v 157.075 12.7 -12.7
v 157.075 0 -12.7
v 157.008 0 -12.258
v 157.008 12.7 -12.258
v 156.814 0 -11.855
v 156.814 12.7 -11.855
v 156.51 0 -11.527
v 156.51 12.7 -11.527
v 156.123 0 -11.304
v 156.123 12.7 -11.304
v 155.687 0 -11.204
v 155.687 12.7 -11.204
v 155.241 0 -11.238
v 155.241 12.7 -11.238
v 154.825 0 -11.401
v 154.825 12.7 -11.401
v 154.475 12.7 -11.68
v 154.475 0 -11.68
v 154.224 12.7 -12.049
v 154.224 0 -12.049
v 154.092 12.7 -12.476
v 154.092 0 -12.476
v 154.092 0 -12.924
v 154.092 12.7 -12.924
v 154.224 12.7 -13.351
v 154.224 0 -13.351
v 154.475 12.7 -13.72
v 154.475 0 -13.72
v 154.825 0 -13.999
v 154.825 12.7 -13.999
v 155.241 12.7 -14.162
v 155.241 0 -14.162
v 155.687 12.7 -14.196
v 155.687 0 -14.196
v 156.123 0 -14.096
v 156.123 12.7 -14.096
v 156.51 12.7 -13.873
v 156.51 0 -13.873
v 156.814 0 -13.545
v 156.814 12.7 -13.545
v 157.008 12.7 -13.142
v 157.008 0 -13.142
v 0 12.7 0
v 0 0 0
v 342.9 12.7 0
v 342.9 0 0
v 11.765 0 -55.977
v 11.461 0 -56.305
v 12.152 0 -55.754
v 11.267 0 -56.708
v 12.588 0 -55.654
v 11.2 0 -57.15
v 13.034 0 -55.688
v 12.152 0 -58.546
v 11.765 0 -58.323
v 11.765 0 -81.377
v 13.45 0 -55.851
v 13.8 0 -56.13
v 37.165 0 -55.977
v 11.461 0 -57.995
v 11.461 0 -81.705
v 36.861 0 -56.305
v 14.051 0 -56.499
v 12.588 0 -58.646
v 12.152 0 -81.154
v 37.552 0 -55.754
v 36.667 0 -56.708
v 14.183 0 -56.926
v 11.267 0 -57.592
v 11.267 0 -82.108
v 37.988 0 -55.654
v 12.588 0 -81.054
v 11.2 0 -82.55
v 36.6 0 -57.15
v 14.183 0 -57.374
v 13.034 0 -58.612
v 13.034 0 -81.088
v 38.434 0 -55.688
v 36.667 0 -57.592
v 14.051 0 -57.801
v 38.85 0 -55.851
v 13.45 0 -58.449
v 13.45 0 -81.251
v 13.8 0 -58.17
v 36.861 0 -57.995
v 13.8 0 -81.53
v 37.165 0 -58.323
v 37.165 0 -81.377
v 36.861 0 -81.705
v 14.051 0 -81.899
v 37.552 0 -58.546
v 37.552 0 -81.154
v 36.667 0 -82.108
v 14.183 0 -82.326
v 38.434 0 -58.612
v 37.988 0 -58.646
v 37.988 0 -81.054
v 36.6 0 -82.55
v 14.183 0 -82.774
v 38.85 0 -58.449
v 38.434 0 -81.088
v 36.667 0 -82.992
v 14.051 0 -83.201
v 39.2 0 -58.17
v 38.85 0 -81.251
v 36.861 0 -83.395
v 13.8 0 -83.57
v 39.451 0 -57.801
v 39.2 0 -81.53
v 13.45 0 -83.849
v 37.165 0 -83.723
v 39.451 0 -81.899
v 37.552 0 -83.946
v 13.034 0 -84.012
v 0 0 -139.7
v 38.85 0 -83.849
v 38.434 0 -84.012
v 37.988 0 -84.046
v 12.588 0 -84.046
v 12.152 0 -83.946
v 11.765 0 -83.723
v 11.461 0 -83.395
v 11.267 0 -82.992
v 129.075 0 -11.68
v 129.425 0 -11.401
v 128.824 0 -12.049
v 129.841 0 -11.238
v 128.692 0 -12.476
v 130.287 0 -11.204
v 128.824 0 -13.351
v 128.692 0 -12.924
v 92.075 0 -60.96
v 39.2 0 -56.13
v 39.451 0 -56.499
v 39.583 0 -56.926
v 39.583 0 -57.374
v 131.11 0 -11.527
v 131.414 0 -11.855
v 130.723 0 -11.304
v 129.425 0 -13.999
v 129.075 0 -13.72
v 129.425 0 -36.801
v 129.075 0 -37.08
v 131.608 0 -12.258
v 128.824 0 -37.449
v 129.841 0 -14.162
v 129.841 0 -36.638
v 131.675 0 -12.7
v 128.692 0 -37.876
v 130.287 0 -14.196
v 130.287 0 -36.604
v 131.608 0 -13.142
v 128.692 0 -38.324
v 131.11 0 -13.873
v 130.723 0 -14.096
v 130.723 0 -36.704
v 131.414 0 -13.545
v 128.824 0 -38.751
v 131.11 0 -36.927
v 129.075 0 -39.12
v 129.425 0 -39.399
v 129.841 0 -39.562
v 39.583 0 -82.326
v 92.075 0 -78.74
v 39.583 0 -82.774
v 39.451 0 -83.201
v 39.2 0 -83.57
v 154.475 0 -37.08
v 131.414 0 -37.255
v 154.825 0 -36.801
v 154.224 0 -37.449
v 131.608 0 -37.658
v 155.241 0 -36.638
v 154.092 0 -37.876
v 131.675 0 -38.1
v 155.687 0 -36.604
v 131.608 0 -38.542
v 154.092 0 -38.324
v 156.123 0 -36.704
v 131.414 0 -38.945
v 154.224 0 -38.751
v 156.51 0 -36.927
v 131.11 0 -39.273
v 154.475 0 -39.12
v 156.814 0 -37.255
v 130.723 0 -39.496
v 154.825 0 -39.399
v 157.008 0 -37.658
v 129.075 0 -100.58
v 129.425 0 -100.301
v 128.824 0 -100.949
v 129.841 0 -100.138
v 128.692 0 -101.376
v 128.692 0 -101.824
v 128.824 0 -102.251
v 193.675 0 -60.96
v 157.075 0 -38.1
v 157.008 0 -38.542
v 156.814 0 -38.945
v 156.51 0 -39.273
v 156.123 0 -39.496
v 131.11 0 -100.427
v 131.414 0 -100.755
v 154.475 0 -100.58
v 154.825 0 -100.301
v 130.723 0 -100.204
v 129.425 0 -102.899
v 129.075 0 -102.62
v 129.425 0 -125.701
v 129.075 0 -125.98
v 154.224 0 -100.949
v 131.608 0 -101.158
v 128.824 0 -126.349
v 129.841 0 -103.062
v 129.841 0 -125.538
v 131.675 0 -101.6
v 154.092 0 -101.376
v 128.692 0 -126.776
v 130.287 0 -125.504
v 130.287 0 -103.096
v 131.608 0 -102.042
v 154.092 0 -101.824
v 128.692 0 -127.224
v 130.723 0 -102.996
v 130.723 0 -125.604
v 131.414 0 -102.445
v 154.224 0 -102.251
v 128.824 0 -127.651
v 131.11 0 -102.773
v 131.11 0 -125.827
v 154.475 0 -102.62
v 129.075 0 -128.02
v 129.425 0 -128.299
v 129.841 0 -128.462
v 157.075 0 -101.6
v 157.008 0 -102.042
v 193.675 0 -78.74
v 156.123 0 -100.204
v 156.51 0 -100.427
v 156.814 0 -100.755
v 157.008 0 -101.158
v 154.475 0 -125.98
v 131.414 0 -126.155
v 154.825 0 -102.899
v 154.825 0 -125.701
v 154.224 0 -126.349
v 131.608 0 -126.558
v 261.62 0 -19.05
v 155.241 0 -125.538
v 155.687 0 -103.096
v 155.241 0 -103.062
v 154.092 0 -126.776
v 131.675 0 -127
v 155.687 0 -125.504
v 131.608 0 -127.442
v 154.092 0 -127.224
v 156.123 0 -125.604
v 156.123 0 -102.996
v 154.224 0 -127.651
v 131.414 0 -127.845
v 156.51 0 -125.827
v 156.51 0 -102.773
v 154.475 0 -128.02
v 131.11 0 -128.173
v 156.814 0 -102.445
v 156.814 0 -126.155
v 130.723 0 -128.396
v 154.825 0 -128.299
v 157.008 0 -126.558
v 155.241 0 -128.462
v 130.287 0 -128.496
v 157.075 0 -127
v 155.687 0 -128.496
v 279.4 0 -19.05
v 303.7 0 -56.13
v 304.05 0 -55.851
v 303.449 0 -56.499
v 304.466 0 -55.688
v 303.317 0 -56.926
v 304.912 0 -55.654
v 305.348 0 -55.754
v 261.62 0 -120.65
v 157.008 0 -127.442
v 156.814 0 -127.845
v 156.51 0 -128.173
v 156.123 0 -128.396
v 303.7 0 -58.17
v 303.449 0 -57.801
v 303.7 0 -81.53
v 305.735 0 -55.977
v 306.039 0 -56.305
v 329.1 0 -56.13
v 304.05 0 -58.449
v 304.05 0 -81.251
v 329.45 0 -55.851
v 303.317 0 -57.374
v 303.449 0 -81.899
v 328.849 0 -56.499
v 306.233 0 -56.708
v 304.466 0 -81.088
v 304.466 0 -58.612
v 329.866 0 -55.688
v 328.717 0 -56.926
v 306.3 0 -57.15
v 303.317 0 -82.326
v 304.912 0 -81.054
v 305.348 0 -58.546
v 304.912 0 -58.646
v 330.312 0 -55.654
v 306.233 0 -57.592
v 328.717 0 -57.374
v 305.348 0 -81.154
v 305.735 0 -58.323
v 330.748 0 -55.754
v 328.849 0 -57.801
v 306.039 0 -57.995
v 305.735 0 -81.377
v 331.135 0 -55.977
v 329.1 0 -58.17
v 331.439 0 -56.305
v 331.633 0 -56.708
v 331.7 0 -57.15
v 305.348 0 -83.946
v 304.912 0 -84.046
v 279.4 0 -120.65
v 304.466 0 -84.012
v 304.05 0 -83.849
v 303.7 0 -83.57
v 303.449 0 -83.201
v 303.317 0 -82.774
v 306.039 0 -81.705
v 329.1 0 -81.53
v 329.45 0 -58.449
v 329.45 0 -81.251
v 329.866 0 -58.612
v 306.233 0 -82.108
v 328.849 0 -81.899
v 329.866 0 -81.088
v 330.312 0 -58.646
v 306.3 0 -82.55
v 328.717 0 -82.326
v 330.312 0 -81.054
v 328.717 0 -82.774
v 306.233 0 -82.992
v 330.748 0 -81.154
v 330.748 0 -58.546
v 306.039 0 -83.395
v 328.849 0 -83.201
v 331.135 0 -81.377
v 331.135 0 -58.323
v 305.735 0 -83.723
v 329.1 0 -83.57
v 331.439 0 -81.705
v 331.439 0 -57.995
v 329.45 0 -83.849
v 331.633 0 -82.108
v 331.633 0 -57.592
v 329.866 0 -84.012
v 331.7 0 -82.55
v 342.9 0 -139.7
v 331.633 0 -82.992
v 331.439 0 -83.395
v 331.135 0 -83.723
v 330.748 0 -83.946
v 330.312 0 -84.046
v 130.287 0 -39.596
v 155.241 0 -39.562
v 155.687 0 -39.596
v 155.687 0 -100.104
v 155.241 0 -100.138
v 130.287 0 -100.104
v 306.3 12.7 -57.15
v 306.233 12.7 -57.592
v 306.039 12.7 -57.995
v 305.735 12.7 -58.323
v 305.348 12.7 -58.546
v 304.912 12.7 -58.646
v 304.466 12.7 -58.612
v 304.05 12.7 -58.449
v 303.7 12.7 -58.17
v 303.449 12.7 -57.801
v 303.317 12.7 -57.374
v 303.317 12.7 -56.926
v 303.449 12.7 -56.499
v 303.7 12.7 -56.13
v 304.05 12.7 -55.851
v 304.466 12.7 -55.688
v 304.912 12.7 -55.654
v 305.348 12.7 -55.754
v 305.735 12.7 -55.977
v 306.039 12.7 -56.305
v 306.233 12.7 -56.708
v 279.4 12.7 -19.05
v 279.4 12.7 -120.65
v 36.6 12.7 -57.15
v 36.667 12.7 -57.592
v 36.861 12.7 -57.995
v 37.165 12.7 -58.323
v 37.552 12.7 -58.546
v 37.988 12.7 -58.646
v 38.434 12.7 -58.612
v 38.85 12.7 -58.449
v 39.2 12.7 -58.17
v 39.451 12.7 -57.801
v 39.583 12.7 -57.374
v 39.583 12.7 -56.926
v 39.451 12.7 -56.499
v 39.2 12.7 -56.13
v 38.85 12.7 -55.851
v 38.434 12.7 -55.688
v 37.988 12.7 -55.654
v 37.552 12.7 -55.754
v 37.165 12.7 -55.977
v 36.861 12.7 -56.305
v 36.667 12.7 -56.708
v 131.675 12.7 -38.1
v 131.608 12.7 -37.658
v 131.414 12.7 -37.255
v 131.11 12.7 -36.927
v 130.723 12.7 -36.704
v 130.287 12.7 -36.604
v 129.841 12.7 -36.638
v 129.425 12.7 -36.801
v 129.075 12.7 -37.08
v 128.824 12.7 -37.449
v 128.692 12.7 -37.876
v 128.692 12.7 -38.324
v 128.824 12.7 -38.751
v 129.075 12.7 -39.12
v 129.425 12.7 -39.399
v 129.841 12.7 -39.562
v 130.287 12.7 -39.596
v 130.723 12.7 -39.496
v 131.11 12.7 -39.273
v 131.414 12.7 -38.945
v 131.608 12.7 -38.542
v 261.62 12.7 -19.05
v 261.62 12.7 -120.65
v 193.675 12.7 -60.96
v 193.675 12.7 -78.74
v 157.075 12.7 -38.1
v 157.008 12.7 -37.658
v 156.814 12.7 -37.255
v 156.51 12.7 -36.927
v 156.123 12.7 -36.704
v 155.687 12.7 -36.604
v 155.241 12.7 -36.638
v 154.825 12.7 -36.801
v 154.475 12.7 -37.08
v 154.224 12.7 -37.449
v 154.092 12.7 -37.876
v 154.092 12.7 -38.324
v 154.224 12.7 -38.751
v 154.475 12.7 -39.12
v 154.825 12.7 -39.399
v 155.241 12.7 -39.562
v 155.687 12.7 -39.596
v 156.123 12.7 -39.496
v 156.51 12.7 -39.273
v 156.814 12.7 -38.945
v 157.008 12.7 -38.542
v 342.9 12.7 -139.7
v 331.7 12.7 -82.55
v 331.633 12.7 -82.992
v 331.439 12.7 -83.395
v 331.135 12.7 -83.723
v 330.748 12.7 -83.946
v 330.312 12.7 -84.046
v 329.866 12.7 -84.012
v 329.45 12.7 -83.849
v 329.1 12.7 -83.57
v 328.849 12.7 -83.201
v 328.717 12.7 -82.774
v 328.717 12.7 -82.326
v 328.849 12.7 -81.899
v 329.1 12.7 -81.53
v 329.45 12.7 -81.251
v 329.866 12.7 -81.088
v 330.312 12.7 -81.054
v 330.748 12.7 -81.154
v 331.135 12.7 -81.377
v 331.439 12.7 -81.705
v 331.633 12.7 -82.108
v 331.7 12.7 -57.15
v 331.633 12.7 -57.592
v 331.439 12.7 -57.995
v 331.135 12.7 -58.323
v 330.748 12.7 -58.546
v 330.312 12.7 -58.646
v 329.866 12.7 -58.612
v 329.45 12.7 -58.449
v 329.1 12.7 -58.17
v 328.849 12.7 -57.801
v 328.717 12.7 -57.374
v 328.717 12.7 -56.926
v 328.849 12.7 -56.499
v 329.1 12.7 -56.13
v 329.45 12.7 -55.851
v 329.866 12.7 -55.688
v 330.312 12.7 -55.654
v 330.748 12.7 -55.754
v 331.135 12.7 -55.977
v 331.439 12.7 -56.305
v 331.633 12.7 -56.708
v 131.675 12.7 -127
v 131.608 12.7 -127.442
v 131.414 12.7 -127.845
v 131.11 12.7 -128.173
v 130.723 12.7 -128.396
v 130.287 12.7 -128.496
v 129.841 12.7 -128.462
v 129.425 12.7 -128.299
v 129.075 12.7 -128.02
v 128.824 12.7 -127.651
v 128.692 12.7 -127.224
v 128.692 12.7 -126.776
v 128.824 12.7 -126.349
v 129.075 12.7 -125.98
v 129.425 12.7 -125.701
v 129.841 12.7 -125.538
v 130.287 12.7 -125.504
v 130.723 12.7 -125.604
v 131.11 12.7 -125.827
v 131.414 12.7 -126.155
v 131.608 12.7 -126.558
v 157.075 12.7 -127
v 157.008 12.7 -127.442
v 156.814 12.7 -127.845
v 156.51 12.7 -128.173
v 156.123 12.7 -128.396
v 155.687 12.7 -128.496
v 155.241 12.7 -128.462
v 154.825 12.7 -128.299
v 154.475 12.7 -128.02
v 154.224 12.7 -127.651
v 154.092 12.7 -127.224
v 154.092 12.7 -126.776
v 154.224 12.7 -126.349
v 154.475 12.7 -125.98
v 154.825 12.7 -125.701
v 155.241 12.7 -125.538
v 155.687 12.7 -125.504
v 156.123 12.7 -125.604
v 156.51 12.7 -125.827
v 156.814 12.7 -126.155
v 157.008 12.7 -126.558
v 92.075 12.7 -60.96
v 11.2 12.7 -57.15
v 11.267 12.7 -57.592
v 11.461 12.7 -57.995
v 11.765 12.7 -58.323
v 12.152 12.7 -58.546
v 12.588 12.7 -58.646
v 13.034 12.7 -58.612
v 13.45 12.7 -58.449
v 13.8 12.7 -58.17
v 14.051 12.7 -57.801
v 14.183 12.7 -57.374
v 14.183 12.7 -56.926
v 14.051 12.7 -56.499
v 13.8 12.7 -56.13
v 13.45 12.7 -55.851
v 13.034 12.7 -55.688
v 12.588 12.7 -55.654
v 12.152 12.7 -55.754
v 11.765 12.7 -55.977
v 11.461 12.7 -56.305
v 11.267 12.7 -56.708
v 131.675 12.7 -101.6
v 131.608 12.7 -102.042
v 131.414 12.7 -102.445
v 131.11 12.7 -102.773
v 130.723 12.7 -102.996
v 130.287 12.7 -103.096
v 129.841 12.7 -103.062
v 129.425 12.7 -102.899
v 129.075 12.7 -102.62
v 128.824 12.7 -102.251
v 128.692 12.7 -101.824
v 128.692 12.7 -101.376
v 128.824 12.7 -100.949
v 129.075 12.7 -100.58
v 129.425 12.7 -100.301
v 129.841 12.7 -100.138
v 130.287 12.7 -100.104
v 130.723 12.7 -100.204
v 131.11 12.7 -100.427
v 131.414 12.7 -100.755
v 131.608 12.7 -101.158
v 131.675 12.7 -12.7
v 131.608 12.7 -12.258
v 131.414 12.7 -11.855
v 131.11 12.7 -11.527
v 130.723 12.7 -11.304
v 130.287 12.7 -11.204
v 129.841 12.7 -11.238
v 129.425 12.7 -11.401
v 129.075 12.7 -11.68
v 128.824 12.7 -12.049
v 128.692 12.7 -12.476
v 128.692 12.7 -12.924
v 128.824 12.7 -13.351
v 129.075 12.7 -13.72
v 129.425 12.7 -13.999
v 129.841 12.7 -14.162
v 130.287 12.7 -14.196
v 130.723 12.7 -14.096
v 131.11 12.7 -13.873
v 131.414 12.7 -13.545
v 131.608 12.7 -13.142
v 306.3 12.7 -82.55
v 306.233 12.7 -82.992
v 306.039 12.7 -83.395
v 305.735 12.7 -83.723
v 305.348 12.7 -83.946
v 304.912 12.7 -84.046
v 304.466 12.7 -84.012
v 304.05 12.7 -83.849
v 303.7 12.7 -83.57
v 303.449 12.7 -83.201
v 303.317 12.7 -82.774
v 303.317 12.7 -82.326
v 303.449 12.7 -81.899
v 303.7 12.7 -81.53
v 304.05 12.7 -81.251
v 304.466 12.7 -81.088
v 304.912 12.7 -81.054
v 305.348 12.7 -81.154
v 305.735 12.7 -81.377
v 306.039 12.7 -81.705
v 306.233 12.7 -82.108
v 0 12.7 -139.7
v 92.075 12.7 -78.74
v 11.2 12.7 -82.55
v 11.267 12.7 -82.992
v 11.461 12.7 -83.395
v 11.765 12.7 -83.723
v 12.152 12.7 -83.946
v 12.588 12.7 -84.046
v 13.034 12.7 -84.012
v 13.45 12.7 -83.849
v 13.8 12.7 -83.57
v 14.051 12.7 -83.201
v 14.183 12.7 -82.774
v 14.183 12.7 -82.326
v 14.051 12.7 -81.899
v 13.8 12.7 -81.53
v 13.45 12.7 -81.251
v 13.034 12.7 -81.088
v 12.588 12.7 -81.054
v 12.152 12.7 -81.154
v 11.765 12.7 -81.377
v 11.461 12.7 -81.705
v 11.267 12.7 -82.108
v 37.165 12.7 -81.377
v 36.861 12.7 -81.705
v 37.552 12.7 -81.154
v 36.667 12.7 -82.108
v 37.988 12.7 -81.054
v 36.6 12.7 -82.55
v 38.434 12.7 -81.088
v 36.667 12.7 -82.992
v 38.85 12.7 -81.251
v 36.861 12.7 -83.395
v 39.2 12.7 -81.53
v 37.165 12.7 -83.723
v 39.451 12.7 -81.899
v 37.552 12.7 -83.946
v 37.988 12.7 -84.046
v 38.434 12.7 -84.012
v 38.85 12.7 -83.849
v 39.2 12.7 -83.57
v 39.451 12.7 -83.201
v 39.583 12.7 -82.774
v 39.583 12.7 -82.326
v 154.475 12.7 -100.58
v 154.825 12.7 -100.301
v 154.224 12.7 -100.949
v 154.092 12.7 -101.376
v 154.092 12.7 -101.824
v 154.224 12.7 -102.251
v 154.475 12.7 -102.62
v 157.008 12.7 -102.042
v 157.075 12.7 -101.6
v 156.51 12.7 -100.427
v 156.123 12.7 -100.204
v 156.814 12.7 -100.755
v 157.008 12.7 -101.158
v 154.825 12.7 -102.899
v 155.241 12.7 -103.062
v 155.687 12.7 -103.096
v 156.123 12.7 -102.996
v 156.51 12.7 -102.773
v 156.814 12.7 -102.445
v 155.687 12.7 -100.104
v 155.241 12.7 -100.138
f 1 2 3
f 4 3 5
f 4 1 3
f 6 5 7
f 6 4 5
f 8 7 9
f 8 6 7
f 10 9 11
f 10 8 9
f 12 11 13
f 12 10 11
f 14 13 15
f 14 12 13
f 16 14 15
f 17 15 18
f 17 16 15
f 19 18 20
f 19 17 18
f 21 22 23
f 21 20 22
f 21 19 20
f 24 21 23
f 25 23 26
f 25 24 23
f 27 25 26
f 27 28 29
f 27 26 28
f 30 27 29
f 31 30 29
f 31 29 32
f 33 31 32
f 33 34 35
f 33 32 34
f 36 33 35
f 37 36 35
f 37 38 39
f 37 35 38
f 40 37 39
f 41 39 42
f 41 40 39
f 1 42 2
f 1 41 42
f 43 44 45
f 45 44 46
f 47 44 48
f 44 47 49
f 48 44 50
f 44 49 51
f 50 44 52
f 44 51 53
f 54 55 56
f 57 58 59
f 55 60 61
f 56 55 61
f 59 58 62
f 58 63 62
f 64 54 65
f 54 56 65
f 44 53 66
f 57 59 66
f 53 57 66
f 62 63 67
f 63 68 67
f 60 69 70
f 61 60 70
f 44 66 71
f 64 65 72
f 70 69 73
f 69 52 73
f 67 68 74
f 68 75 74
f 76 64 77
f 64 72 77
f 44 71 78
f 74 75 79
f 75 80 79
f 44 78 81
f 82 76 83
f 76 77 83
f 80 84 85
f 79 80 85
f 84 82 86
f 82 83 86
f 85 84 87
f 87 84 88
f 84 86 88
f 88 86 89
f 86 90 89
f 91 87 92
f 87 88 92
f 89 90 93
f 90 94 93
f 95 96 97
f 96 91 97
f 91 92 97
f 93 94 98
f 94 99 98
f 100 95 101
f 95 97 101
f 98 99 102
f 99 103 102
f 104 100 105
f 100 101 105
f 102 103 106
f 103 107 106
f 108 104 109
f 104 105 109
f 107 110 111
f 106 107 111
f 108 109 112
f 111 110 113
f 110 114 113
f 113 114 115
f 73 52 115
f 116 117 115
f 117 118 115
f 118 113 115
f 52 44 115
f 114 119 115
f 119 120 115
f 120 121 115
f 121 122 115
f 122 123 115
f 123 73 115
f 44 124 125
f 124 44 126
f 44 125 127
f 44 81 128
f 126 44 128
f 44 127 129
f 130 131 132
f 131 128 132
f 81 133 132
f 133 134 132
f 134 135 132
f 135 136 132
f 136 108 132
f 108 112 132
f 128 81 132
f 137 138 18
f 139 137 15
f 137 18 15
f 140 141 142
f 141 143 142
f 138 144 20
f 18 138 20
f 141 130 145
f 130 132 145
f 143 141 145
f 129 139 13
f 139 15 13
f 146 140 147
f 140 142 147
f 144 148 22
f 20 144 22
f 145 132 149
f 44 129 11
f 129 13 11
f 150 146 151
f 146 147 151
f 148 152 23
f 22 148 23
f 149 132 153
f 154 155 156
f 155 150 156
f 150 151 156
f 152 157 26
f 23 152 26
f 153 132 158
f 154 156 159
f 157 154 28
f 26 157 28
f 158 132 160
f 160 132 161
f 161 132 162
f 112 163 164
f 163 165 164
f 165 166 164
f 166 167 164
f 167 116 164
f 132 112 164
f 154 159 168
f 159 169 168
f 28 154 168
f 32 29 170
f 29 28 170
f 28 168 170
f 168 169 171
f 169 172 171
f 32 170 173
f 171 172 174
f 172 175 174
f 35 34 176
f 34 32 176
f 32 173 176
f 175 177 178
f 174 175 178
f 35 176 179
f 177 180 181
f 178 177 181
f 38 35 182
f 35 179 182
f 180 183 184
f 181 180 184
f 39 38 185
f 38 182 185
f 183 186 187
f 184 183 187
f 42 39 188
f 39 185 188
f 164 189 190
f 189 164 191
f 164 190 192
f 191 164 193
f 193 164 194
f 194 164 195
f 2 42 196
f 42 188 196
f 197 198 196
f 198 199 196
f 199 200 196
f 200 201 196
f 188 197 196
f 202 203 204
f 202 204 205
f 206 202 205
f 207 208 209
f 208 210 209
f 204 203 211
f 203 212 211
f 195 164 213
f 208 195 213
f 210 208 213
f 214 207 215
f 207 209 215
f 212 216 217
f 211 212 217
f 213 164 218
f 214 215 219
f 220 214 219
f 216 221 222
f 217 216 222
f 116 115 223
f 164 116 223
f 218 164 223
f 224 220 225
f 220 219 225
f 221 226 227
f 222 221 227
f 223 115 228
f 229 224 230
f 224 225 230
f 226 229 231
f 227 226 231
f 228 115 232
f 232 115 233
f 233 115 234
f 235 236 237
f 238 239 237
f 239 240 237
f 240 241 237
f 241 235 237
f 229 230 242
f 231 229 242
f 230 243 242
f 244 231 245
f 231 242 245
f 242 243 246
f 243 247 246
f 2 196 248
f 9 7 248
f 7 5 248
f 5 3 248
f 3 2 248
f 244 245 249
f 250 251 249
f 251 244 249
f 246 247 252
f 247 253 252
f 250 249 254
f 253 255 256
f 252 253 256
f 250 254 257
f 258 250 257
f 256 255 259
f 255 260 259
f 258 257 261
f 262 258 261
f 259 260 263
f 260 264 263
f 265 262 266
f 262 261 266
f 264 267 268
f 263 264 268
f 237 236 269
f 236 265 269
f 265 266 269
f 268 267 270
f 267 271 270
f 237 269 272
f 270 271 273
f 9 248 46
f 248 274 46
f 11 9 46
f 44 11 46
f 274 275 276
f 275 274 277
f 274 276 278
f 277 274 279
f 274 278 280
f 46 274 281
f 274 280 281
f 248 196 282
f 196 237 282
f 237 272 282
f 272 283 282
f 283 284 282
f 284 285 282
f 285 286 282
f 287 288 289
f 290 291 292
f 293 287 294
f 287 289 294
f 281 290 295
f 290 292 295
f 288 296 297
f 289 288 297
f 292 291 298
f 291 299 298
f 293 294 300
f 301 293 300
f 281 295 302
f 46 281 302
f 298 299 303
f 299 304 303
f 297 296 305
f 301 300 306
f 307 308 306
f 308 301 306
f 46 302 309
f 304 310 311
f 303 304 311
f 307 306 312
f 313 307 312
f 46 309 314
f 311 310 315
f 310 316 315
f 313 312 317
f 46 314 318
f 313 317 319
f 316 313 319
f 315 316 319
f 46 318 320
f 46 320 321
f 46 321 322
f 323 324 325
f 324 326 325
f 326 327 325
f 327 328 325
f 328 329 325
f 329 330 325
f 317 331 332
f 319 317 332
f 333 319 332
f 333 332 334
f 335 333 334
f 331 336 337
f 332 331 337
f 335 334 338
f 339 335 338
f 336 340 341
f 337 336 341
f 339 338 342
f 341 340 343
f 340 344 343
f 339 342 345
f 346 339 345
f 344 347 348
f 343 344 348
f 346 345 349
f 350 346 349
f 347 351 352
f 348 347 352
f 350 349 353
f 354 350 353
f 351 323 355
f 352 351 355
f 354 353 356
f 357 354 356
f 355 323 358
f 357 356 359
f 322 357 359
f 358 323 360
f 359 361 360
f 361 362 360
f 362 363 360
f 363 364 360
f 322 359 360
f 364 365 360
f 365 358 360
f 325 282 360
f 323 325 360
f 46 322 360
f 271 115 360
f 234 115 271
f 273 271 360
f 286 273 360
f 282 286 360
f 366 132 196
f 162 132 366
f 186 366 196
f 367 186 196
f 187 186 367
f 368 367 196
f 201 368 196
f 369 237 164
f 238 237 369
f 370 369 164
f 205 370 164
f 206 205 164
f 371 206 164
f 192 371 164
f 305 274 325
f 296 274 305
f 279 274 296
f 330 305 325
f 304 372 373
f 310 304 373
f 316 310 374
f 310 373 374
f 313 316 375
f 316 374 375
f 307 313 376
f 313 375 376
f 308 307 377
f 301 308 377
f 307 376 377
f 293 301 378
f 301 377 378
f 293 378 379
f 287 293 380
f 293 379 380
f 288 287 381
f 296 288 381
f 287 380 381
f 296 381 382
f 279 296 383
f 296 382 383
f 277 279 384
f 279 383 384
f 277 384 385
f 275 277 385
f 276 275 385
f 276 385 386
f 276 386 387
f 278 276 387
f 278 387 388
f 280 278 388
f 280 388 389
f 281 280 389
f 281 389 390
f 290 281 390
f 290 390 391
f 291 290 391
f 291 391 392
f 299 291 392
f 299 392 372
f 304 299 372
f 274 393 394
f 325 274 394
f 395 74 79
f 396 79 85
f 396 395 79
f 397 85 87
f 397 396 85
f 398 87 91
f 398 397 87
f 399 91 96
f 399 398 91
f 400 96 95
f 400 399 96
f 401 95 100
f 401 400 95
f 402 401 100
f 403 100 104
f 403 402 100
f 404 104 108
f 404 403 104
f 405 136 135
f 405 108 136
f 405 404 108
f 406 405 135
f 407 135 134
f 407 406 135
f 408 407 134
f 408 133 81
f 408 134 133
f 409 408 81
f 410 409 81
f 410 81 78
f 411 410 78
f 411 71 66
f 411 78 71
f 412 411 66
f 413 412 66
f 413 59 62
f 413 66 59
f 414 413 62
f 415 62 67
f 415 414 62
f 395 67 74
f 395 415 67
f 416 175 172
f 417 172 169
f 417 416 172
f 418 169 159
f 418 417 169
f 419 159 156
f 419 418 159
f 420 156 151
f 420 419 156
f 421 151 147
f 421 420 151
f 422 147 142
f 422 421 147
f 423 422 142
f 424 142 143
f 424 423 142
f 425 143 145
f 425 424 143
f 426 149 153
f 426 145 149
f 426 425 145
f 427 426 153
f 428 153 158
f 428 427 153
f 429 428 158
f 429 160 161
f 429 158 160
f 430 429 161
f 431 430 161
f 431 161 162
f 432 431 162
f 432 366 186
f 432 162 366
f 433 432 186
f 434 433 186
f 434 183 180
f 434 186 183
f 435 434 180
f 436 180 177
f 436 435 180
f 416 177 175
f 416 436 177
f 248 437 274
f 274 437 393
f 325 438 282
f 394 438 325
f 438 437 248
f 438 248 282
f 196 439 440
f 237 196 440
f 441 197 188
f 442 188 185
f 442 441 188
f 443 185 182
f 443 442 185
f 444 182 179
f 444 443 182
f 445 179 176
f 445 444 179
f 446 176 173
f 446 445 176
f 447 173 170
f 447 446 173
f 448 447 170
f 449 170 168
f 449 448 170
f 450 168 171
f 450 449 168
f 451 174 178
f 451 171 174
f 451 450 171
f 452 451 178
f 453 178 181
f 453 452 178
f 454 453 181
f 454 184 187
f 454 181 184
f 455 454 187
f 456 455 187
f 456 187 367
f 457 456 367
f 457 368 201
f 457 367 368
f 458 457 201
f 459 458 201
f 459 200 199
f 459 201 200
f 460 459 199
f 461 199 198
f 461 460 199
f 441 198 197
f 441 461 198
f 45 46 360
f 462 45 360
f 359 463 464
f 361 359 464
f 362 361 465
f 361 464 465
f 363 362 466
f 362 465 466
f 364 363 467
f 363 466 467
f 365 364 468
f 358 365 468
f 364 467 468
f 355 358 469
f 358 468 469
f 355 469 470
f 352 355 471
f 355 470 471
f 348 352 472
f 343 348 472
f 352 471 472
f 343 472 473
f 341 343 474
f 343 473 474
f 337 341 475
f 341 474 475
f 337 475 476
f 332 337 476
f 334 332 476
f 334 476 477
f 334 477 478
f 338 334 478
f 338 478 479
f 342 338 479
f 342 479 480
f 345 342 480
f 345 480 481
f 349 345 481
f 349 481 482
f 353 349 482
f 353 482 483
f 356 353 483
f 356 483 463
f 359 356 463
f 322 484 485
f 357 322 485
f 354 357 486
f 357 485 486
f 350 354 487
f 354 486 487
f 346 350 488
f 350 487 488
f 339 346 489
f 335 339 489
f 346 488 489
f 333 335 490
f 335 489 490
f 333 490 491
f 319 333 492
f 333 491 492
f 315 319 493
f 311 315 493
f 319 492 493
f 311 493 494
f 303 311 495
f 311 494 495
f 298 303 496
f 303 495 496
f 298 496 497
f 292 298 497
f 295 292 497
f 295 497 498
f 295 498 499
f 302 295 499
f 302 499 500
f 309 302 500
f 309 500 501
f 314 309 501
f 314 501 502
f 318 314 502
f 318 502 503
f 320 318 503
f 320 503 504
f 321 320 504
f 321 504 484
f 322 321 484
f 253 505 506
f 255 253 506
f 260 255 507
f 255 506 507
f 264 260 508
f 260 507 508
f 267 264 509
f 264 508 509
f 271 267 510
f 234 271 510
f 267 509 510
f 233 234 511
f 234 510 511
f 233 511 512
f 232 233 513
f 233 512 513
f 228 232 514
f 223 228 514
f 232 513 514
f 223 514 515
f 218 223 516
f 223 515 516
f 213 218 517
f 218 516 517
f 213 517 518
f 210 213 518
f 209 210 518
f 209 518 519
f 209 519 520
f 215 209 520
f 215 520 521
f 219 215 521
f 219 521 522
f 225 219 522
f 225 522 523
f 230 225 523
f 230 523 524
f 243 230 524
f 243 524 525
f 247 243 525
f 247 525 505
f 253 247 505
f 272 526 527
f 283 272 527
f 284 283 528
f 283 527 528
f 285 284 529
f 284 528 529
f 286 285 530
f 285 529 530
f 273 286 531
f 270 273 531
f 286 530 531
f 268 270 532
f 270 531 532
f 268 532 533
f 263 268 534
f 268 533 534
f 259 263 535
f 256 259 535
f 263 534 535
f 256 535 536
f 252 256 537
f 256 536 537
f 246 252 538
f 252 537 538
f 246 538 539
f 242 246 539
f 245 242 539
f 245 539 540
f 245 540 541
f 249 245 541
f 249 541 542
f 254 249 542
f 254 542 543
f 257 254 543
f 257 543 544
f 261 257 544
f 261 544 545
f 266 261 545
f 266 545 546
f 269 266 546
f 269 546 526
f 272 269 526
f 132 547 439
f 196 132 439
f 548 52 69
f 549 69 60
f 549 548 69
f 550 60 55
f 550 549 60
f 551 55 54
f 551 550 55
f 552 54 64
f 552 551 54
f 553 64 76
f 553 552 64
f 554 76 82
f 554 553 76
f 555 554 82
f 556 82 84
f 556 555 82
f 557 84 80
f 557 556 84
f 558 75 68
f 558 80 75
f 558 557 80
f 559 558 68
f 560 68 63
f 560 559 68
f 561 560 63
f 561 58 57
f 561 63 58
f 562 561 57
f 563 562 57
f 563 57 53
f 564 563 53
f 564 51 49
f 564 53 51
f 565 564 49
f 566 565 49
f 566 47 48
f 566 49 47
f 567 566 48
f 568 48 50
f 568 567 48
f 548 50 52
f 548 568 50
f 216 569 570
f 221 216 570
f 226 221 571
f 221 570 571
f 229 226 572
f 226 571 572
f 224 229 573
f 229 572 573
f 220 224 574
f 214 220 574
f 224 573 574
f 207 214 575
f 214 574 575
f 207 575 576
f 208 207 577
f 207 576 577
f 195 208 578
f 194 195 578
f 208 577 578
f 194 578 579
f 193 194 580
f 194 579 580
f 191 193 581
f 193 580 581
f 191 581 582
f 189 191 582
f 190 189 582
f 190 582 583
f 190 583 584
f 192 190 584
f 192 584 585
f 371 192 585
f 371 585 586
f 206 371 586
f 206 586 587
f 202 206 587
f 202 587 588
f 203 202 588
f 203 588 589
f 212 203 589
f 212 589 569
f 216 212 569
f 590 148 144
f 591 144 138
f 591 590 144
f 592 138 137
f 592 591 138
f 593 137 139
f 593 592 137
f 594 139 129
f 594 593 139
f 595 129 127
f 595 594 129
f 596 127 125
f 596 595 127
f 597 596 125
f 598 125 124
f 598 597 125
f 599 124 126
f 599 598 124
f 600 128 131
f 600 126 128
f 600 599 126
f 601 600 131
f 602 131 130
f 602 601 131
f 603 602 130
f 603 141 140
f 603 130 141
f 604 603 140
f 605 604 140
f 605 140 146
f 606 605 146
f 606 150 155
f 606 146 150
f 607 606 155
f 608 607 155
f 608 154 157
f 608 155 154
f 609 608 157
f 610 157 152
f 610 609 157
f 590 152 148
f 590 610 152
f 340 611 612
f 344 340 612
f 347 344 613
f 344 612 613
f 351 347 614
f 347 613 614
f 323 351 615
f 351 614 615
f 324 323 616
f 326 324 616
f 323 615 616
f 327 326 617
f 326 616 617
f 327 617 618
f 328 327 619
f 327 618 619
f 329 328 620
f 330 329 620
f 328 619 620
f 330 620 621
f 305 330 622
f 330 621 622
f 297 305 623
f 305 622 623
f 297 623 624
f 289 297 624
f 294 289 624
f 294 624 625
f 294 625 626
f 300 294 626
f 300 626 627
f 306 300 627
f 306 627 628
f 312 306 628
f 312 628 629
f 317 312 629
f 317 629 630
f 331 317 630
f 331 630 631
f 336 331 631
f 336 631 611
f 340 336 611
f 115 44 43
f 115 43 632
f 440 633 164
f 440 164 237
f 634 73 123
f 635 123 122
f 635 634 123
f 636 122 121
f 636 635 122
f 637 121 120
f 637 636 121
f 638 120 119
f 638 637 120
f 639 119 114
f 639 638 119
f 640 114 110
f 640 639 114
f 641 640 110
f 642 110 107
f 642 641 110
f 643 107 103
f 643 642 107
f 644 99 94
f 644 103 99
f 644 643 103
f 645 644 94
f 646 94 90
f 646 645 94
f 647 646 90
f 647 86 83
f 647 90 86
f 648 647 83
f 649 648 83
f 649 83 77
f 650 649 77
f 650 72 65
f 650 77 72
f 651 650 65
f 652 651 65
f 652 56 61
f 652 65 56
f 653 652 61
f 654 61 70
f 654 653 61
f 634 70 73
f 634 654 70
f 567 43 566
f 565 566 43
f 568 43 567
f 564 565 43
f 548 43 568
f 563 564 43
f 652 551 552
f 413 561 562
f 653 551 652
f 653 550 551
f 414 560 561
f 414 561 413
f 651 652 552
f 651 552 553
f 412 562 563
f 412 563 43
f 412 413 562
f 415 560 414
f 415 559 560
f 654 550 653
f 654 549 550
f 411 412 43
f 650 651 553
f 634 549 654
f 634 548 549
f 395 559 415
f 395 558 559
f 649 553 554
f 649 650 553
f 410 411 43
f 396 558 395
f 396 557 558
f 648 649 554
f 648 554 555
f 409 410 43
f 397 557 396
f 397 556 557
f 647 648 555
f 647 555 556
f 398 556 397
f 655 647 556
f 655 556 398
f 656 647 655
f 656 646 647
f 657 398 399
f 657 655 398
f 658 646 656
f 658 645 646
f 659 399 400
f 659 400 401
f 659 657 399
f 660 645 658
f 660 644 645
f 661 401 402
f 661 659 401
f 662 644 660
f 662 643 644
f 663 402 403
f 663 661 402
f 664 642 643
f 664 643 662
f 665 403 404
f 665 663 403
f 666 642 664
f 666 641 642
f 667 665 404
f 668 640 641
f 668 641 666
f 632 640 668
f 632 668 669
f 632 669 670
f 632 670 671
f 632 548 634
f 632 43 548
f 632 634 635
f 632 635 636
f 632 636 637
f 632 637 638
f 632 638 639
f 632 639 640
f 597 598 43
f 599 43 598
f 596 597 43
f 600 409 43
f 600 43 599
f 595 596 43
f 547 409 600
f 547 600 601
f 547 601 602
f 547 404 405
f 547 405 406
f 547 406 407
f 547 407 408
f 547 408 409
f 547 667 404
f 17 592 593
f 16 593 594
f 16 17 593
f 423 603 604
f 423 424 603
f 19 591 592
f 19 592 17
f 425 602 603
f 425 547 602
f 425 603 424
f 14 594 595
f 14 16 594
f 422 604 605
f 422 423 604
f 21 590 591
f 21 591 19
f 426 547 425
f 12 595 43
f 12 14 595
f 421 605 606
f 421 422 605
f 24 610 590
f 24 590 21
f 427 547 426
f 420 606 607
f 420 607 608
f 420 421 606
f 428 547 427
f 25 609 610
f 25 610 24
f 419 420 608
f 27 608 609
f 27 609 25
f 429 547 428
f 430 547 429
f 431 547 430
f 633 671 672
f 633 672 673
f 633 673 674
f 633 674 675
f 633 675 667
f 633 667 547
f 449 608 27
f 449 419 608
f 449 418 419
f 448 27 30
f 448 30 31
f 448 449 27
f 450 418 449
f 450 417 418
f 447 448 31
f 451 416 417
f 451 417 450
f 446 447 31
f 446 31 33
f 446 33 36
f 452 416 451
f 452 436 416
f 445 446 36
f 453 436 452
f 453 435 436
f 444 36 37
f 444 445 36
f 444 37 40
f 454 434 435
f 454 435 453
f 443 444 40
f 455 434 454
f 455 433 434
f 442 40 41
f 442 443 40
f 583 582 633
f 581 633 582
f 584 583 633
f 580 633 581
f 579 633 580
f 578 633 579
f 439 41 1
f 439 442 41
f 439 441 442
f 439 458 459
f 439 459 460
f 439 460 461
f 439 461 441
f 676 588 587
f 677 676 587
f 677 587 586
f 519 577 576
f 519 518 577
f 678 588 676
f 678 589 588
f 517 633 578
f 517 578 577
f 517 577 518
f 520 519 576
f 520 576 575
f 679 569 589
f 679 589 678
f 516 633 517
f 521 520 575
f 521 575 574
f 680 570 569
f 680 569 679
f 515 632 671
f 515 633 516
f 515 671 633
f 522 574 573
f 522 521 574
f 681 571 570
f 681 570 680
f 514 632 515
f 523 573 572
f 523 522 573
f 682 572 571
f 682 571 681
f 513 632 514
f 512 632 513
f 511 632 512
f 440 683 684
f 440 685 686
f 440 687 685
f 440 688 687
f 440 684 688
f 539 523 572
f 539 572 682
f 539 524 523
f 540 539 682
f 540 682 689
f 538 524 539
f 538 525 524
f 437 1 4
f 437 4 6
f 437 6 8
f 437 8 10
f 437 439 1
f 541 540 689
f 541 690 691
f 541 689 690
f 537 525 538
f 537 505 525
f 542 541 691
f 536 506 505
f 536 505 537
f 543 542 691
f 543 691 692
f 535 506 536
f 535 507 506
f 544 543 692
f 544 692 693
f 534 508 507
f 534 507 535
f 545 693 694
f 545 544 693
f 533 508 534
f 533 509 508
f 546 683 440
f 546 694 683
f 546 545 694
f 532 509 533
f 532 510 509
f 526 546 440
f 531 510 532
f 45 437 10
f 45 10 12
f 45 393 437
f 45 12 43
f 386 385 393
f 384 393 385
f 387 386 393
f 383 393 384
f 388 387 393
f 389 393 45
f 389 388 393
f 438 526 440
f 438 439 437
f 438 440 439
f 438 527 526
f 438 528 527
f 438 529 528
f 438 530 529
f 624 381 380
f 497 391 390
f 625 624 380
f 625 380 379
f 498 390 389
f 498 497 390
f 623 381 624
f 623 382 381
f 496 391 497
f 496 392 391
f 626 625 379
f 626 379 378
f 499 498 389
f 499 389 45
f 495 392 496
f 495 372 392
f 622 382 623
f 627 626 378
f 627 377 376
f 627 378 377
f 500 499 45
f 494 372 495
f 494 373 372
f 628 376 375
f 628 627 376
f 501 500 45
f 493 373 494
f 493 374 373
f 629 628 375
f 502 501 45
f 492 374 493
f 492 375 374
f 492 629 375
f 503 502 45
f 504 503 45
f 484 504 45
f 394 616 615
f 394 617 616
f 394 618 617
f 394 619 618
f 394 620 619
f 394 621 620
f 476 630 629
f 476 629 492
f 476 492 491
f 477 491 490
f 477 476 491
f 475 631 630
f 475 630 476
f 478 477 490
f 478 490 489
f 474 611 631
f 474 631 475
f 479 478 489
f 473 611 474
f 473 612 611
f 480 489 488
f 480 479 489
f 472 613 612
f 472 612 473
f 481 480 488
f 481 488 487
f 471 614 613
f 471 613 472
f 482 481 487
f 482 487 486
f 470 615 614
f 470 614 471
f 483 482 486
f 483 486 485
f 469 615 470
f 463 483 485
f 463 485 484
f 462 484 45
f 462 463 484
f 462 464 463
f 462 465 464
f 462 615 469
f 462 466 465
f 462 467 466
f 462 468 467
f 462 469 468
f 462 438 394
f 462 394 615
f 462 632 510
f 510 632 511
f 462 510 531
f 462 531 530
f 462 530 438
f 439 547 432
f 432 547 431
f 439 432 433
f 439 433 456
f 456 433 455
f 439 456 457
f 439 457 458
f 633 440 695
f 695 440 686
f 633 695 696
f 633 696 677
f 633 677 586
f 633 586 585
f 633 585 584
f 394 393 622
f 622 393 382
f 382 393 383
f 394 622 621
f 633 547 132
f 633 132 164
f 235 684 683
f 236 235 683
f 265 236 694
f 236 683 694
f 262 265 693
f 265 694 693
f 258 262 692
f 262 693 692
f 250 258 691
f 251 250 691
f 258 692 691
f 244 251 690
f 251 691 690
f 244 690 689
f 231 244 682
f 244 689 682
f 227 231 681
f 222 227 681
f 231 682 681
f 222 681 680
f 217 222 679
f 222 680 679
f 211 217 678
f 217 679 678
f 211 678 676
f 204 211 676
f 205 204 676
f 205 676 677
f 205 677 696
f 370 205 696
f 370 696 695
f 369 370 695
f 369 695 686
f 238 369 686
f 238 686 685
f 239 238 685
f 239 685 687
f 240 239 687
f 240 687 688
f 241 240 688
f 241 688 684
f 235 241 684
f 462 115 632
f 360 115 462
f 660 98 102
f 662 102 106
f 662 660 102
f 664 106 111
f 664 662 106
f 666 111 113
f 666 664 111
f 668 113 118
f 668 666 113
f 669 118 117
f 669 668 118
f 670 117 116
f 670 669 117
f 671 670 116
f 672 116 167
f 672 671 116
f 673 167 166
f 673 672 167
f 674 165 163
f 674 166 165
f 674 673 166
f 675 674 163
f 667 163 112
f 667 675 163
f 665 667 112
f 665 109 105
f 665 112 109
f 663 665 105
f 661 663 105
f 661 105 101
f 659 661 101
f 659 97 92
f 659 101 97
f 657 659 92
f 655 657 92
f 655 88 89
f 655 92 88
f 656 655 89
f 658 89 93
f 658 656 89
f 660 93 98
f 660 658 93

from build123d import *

# Parameters (mm, degrees)
SKETCH1_W           = 342.9
SKETCH1_H           = 139.7
BOSS_EXTRUDE1_DEPTH = 12.7
SKETCH3_R           = 1.5
SKETCH3_R_2         = 1.500000048
CUT_EXTRUDE1_DEPTH  = 13.7
SKETCH4_W           = 17.78
SKETCH4_H           = 101.6
SKETCH4_W_2         = 101.6
SKETCH4_H_2         = 17.78
CUT_EXTRUDE2_DEPTH  = 13.7
SKETCH5_R           = 1.5
CUT_EXTRUDE3_DEPTH  = 13.7


with BuildPart() as part:
    # Sketch1 → Boss-Extrude1 (new body)
    with BuildSketch(Plane(origin=(0, 0, 0), x_dir=(1, 0, 0), z_dir=(0, 1, 0))):
        with Locations((171.45, 69.85)):
            Rectangle(SKETCH1_W, SKETCH1_H)
    extrude(amount=BOSS_EXTRUDE1_DEPTH)

    # Sketch3 → Cut-Extrude1 (cut, through all)
    with BuildSketch(Plane(origin=(0, 12.7, 0), x_dir=(1, 0, 0), z_dir=(0, 1, 0))):
        with Locations((330.2, 82.55)):
            Circle(SKETCH3_R)
        with Locations((330.2, 57.15)):
            Circle(SKETCH3_R_2)
        with Locations((304.8, 57.15)):
            Circle(SKETCH3_R)
        with Locations((304.8, 82.55)):
            Circle(SKETCH3_R_2)
    cut_extrude1 = extrude(amount=-CUT_EXTRUDE1_DEPTH, mode=Mode.SUBTRACT)

    # Mirror1: Cut-Extrude1 across plane
    add(cut_extrude1.mirror(Plane.ZY.offset(-171.45)), mode=Mode.SUBTRACT)

    # Sketch4 → Cut-Extrude2 (cut, through all)
    with BuildSketch(Plane(origin=(0, 12.7, 0), x_dir=(1, 0, 0), z_dir=(0, 1, 0))):
        with Locations((270.51, 69.85)):
            Rectangle(SKETCH4_W, SKETCH4_H)
        with Locations((142.875, 69.85)):
            Rectangle(SKETCH4_W_2, SKETCH4_H_2)
    extrude(amount=-CUT_EXTRUDE2_DEPTH, mode=Mode.SUBTRACT)

    # Sketch5 → Cut-Extrude3 (cut, through all)
    with BuildSketch(Plane(origin=(0, 12.7, 0), x_dir=(1, 0, 0), z_dir=(0, 1, 0))):
        with Locations((130.175, 127)):
            Circle(SKETCH5_R)
        with Locations((155.575, 127)):
            Circle(SKETCH5_R)
        with Locations((155.575, 101.6)):
            Circle(SKETCH5_R)
        with Locations((130.175, 101.6)):
            Circle(SKETCH5_R)
    cut_extrude3 = extrude(amount=-CUT_EXTRUDE3_DEPTH, mode=Mode.SUBTRACT)

    # Mirror3: Cut-Extrude3 across plane
    add(cut_extrude3.mirror(Plane(origin=(0, 0, -69.85), x_dir=(1, 0, 0), z_dir=(0, 0, -1))), mode=Mode.SUBTRACT)


solid = part.part
